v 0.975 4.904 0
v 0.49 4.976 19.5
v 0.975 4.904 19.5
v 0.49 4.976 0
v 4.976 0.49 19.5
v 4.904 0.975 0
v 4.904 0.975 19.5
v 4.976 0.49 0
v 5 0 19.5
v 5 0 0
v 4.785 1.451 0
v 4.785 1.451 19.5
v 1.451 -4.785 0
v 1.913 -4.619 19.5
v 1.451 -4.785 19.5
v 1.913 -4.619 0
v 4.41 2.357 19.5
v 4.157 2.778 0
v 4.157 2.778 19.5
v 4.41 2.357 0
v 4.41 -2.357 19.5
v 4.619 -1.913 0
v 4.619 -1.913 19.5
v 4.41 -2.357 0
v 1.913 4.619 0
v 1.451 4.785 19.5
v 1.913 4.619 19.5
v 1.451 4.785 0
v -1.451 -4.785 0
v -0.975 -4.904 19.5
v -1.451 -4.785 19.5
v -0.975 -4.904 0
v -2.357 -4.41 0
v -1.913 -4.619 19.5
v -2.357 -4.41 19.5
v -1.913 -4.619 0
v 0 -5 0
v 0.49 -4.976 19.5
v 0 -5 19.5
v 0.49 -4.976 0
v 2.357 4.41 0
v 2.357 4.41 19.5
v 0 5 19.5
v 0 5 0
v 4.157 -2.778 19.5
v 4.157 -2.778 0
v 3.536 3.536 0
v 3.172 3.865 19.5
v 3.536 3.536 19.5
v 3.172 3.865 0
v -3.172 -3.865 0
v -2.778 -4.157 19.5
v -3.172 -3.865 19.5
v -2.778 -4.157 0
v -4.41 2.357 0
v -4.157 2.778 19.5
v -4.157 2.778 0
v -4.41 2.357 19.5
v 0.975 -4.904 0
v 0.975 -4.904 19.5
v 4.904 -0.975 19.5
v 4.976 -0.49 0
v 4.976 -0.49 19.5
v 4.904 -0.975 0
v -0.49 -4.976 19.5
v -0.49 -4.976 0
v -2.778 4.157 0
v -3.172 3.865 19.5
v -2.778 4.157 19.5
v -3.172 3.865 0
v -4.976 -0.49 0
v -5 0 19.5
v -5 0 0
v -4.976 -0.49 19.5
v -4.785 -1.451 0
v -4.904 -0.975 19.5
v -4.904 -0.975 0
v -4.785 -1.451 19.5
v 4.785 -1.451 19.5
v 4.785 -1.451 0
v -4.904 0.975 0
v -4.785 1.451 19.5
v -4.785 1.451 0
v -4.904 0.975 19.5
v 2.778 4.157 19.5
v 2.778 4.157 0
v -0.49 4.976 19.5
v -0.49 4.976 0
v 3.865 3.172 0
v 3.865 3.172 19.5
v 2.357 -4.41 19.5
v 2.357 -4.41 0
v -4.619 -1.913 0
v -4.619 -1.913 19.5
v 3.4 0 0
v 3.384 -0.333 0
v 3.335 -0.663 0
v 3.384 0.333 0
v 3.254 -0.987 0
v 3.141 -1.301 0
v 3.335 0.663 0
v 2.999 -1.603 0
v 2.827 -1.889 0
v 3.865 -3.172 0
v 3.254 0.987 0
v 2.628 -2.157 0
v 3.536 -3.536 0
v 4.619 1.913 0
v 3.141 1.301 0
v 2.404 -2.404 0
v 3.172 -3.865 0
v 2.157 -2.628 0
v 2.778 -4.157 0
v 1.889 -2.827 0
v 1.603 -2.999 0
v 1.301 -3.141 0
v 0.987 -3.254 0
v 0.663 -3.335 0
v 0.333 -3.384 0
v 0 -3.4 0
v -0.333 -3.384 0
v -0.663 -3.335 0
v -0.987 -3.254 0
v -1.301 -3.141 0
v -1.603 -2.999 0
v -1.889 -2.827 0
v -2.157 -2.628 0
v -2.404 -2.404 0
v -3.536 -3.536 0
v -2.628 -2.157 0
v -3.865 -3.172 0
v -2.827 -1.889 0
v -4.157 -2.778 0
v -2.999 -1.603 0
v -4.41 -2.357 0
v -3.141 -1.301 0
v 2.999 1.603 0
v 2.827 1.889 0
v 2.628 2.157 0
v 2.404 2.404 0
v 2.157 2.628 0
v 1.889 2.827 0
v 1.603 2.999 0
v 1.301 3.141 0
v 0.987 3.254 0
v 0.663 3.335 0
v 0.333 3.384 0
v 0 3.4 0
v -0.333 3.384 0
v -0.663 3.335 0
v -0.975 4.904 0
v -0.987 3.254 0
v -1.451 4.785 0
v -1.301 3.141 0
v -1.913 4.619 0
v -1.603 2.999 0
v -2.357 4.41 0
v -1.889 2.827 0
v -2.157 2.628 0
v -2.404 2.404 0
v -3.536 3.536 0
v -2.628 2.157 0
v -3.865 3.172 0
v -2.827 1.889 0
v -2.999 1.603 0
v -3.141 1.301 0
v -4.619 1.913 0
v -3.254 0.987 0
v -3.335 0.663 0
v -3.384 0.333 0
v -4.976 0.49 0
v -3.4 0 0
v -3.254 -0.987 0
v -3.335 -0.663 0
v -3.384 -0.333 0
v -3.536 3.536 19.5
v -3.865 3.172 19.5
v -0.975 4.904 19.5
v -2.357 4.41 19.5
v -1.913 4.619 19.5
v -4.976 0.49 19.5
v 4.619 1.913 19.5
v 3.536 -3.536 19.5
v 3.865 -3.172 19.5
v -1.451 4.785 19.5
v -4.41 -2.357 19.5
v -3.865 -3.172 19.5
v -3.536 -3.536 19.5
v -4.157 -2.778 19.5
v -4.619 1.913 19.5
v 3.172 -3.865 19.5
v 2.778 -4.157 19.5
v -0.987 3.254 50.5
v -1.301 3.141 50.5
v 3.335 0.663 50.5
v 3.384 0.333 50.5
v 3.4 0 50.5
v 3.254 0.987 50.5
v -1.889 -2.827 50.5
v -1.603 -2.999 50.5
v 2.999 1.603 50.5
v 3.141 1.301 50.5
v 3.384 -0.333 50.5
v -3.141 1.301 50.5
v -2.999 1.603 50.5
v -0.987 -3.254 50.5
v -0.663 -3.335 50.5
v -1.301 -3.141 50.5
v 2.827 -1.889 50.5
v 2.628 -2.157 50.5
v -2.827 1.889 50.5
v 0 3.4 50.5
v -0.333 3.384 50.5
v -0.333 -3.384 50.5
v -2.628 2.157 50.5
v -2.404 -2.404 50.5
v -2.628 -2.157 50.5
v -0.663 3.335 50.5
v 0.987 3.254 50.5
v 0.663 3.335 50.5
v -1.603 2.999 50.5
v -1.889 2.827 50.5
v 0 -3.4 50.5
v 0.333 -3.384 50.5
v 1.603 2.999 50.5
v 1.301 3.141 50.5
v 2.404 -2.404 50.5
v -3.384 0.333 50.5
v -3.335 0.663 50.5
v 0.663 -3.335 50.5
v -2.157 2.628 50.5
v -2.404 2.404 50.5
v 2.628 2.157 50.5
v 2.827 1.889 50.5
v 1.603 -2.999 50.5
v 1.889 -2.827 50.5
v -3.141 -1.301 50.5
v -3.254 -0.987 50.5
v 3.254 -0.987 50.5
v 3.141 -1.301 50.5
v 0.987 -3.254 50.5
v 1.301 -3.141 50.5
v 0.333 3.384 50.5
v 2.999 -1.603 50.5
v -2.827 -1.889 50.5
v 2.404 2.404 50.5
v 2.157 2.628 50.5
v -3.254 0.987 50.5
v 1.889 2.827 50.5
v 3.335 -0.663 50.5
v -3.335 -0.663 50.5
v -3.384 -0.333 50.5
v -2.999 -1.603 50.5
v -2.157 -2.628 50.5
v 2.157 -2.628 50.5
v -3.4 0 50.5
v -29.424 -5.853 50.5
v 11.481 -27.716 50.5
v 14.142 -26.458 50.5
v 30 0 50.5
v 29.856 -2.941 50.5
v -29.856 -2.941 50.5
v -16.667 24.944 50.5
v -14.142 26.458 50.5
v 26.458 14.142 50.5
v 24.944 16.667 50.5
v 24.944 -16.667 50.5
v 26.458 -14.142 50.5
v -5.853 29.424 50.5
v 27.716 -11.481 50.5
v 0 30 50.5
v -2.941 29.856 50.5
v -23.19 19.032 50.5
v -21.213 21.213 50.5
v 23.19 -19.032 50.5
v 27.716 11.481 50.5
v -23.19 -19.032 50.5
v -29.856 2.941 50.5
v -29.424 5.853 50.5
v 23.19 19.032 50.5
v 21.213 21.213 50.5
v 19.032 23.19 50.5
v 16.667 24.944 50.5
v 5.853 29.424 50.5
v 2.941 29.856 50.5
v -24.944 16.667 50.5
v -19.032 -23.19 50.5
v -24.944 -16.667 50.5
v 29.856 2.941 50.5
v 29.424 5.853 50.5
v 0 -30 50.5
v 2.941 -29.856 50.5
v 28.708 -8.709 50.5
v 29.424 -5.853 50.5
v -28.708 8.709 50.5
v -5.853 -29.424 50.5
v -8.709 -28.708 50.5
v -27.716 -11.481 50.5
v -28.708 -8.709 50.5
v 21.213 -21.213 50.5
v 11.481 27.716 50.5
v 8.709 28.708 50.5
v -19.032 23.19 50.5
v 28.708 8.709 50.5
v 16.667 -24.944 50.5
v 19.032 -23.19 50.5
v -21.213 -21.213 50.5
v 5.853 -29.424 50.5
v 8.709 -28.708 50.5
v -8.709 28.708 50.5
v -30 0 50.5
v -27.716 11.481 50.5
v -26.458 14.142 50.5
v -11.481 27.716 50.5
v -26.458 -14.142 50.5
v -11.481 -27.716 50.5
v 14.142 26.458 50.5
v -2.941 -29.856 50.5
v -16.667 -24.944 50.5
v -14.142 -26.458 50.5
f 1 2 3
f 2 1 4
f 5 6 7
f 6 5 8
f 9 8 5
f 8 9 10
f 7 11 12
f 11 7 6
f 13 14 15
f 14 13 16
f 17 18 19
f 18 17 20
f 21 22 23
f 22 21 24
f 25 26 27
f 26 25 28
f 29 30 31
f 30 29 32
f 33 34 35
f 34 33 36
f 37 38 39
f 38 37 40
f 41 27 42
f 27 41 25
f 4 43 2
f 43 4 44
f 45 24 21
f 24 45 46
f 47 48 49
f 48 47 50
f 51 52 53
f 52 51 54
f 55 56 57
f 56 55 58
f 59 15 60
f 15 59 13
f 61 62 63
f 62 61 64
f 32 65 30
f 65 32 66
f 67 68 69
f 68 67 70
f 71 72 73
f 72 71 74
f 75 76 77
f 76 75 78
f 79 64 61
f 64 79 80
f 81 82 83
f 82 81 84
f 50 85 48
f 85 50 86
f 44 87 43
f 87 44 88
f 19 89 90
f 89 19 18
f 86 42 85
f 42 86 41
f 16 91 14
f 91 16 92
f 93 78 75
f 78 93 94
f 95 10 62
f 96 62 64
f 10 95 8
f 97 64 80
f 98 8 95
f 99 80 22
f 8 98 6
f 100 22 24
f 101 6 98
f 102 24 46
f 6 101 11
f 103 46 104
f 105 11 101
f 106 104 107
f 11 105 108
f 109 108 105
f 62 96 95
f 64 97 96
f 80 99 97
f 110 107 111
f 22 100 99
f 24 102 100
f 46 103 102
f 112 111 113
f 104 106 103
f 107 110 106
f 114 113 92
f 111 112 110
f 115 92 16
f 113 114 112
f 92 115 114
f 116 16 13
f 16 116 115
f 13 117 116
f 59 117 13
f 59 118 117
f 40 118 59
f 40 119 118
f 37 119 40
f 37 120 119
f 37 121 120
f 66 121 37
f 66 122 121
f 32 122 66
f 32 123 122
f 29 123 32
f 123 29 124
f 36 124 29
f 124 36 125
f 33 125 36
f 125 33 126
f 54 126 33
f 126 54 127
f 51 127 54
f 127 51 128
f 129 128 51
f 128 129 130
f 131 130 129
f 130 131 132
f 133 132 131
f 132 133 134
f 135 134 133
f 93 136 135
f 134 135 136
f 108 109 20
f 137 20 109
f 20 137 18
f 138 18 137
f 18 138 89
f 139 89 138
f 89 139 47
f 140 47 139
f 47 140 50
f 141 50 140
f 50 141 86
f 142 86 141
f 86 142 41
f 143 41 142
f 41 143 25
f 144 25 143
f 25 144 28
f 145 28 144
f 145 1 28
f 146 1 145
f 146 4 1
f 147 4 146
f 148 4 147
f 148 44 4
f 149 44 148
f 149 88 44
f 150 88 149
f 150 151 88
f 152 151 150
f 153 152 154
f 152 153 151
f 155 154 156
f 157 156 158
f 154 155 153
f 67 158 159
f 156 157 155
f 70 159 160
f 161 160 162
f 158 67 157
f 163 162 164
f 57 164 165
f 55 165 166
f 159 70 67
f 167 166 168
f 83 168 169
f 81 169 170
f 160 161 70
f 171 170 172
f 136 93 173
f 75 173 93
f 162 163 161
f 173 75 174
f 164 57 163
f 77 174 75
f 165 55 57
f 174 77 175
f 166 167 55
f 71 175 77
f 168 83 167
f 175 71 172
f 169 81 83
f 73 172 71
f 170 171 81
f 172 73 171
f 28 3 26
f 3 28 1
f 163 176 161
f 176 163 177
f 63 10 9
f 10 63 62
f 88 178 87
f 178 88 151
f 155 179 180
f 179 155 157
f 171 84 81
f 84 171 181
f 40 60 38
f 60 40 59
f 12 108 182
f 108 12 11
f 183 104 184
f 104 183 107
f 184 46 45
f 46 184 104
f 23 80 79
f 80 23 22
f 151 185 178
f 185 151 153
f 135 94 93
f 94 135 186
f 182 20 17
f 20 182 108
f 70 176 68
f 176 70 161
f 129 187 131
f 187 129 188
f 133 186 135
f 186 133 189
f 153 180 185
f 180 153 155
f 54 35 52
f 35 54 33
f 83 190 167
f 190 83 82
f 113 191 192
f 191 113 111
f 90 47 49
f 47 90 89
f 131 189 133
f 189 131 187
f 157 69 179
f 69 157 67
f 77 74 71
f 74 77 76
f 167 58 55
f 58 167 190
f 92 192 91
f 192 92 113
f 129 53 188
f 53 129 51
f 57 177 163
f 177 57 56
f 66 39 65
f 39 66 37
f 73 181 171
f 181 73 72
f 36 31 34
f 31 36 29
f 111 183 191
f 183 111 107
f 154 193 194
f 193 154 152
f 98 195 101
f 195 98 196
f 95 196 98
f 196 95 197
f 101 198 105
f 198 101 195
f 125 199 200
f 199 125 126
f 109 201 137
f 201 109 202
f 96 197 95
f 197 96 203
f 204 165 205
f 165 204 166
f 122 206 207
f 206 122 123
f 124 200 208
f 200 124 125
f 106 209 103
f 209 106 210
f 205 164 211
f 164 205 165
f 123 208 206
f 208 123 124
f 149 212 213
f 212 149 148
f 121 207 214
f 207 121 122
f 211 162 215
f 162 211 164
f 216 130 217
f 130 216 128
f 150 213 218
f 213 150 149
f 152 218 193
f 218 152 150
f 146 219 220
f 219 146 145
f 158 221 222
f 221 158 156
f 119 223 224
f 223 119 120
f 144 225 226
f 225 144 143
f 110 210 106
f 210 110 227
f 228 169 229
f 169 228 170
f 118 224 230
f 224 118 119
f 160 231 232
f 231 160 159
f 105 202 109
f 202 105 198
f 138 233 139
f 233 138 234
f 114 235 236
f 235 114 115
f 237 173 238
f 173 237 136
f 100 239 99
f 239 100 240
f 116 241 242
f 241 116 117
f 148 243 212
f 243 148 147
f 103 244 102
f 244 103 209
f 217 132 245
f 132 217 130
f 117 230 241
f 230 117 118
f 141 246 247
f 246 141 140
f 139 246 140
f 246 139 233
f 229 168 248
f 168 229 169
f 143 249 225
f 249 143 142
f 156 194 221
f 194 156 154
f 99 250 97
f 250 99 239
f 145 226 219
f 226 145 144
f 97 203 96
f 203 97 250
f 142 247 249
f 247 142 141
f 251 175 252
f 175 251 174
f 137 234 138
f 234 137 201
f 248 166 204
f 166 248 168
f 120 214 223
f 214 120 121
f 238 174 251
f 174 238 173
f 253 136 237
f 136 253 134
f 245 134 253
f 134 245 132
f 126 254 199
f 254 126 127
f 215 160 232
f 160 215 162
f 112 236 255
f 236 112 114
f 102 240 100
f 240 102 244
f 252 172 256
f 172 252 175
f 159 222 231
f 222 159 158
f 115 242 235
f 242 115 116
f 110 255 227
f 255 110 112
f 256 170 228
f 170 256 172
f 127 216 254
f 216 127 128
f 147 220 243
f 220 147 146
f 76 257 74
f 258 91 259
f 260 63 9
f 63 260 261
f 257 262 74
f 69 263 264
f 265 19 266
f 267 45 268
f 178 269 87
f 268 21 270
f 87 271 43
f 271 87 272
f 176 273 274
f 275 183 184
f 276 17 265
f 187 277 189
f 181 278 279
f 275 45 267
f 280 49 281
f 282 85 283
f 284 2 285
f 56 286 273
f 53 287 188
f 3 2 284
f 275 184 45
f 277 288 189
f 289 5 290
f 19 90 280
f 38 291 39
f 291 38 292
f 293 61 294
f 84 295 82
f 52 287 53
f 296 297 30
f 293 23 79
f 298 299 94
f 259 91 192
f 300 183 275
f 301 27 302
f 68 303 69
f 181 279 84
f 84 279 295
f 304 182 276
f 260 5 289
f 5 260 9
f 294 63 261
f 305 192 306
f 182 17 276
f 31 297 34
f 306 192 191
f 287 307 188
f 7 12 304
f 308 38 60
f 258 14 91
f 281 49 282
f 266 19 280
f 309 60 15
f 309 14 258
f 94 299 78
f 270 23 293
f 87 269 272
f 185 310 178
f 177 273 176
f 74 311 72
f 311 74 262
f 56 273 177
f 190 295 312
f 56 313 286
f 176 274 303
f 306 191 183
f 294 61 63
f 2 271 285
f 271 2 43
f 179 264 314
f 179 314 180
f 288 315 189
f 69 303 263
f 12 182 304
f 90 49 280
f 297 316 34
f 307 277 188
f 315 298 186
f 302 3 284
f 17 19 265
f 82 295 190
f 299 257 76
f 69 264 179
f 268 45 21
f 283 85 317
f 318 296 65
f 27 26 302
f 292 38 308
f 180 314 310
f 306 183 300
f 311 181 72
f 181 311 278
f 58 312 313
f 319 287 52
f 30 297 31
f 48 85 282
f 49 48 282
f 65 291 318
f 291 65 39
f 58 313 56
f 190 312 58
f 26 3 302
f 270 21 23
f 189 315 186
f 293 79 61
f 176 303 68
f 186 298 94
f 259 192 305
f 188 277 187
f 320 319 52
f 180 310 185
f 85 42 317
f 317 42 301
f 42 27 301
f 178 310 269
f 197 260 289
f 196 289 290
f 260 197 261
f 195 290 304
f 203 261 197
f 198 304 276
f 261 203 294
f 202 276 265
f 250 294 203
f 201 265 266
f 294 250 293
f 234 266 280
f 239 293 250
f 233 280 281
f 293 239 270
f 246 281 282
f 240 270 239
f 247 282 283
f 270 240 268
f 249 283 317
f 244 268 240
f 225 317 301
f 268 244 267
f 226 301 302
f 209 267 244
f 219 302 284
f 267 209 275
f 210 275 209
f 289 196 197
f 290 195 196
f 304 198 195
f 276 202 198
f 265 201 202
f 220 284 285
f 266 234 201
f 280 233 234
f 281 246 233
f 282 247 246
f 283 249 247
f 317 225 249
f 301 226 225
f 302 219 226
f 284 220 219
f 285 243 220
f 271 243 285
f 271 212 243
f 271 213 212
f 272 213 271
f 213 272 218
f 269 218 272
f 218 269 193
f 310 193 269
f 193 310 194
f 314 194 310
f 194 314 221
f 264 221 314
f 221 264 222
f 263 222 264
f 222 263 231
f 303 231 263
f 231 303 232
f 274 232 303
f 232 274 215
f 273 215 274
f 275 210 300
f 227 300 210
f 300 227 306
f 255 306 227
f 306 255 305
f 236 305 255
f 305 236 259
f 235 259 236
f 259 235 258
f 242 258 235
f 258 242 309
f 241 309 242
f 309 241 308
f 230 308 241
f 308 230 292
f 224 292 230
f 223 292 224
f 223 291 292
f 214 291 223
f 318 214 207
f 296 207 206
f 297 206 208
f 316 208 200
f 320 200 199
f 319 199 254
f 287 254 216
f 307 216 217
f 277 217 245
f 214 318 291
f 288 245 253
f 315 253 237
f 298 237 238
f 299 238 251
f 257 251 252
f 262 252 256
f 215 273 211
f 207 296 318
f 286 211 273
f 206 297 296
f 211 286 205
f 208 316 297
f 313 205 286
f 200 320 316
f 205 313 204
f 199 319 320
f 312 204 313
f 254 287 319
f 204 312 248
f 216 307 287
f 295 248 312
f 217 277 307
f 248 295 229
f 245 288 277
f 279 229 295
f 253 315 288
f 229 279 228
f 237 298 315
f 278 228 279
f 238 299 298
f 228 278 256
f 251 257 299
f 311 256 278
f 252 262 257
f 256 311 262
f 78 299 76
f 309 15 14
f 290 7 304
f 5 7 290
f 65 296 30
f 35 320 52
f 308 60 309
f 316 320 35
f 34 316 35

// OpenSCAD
// Lab funnel - printed upright, open at top and bottom
// Units: mm

$fn = 64;

// --- Dimensions ---
spout_od    = 10;    // spout outer diameter
spout_id    = spout_od - 2 * 1.6;  // spout bore (6.8 mm)
spout_h     = 20;    // spout height (z = 0 to 20)
cone_od     = 60;    // funnel rim outer diameter
cone_z      = 50;    // funnel rim height
wall        = 1.6;   // wall thickness everywhere

// --- Derived ---
cone_h = cone_z - spout_h;  // cone height (30 mm)
eps    = 0.5;           // overlap for clean booleans

union() {
    // Spout: cylinder from z = 0 to z = 20
    difference() {
        translate([0, 0, 0])
            cylinder(d = spout_od, h = spout_h);
        translate([0, 0, -eps])
            cylinder(d = spout_id, h = spout_h + 2 * eps);
    }

    // Cone: from z = 20 to z = 50, overlapping slightly into the spout
    difference() {
        translate([0, 0, spout_h - eps])
            cylinder(d1 = spout_od, d2 = cone_od, h = cone_h + 2 * eps);
        translate([0, 0, spout_h - eps - 0.01])
            cylinder(d = spout_id, h = cone_h + 2 * eps + 0.01);
    }
}
